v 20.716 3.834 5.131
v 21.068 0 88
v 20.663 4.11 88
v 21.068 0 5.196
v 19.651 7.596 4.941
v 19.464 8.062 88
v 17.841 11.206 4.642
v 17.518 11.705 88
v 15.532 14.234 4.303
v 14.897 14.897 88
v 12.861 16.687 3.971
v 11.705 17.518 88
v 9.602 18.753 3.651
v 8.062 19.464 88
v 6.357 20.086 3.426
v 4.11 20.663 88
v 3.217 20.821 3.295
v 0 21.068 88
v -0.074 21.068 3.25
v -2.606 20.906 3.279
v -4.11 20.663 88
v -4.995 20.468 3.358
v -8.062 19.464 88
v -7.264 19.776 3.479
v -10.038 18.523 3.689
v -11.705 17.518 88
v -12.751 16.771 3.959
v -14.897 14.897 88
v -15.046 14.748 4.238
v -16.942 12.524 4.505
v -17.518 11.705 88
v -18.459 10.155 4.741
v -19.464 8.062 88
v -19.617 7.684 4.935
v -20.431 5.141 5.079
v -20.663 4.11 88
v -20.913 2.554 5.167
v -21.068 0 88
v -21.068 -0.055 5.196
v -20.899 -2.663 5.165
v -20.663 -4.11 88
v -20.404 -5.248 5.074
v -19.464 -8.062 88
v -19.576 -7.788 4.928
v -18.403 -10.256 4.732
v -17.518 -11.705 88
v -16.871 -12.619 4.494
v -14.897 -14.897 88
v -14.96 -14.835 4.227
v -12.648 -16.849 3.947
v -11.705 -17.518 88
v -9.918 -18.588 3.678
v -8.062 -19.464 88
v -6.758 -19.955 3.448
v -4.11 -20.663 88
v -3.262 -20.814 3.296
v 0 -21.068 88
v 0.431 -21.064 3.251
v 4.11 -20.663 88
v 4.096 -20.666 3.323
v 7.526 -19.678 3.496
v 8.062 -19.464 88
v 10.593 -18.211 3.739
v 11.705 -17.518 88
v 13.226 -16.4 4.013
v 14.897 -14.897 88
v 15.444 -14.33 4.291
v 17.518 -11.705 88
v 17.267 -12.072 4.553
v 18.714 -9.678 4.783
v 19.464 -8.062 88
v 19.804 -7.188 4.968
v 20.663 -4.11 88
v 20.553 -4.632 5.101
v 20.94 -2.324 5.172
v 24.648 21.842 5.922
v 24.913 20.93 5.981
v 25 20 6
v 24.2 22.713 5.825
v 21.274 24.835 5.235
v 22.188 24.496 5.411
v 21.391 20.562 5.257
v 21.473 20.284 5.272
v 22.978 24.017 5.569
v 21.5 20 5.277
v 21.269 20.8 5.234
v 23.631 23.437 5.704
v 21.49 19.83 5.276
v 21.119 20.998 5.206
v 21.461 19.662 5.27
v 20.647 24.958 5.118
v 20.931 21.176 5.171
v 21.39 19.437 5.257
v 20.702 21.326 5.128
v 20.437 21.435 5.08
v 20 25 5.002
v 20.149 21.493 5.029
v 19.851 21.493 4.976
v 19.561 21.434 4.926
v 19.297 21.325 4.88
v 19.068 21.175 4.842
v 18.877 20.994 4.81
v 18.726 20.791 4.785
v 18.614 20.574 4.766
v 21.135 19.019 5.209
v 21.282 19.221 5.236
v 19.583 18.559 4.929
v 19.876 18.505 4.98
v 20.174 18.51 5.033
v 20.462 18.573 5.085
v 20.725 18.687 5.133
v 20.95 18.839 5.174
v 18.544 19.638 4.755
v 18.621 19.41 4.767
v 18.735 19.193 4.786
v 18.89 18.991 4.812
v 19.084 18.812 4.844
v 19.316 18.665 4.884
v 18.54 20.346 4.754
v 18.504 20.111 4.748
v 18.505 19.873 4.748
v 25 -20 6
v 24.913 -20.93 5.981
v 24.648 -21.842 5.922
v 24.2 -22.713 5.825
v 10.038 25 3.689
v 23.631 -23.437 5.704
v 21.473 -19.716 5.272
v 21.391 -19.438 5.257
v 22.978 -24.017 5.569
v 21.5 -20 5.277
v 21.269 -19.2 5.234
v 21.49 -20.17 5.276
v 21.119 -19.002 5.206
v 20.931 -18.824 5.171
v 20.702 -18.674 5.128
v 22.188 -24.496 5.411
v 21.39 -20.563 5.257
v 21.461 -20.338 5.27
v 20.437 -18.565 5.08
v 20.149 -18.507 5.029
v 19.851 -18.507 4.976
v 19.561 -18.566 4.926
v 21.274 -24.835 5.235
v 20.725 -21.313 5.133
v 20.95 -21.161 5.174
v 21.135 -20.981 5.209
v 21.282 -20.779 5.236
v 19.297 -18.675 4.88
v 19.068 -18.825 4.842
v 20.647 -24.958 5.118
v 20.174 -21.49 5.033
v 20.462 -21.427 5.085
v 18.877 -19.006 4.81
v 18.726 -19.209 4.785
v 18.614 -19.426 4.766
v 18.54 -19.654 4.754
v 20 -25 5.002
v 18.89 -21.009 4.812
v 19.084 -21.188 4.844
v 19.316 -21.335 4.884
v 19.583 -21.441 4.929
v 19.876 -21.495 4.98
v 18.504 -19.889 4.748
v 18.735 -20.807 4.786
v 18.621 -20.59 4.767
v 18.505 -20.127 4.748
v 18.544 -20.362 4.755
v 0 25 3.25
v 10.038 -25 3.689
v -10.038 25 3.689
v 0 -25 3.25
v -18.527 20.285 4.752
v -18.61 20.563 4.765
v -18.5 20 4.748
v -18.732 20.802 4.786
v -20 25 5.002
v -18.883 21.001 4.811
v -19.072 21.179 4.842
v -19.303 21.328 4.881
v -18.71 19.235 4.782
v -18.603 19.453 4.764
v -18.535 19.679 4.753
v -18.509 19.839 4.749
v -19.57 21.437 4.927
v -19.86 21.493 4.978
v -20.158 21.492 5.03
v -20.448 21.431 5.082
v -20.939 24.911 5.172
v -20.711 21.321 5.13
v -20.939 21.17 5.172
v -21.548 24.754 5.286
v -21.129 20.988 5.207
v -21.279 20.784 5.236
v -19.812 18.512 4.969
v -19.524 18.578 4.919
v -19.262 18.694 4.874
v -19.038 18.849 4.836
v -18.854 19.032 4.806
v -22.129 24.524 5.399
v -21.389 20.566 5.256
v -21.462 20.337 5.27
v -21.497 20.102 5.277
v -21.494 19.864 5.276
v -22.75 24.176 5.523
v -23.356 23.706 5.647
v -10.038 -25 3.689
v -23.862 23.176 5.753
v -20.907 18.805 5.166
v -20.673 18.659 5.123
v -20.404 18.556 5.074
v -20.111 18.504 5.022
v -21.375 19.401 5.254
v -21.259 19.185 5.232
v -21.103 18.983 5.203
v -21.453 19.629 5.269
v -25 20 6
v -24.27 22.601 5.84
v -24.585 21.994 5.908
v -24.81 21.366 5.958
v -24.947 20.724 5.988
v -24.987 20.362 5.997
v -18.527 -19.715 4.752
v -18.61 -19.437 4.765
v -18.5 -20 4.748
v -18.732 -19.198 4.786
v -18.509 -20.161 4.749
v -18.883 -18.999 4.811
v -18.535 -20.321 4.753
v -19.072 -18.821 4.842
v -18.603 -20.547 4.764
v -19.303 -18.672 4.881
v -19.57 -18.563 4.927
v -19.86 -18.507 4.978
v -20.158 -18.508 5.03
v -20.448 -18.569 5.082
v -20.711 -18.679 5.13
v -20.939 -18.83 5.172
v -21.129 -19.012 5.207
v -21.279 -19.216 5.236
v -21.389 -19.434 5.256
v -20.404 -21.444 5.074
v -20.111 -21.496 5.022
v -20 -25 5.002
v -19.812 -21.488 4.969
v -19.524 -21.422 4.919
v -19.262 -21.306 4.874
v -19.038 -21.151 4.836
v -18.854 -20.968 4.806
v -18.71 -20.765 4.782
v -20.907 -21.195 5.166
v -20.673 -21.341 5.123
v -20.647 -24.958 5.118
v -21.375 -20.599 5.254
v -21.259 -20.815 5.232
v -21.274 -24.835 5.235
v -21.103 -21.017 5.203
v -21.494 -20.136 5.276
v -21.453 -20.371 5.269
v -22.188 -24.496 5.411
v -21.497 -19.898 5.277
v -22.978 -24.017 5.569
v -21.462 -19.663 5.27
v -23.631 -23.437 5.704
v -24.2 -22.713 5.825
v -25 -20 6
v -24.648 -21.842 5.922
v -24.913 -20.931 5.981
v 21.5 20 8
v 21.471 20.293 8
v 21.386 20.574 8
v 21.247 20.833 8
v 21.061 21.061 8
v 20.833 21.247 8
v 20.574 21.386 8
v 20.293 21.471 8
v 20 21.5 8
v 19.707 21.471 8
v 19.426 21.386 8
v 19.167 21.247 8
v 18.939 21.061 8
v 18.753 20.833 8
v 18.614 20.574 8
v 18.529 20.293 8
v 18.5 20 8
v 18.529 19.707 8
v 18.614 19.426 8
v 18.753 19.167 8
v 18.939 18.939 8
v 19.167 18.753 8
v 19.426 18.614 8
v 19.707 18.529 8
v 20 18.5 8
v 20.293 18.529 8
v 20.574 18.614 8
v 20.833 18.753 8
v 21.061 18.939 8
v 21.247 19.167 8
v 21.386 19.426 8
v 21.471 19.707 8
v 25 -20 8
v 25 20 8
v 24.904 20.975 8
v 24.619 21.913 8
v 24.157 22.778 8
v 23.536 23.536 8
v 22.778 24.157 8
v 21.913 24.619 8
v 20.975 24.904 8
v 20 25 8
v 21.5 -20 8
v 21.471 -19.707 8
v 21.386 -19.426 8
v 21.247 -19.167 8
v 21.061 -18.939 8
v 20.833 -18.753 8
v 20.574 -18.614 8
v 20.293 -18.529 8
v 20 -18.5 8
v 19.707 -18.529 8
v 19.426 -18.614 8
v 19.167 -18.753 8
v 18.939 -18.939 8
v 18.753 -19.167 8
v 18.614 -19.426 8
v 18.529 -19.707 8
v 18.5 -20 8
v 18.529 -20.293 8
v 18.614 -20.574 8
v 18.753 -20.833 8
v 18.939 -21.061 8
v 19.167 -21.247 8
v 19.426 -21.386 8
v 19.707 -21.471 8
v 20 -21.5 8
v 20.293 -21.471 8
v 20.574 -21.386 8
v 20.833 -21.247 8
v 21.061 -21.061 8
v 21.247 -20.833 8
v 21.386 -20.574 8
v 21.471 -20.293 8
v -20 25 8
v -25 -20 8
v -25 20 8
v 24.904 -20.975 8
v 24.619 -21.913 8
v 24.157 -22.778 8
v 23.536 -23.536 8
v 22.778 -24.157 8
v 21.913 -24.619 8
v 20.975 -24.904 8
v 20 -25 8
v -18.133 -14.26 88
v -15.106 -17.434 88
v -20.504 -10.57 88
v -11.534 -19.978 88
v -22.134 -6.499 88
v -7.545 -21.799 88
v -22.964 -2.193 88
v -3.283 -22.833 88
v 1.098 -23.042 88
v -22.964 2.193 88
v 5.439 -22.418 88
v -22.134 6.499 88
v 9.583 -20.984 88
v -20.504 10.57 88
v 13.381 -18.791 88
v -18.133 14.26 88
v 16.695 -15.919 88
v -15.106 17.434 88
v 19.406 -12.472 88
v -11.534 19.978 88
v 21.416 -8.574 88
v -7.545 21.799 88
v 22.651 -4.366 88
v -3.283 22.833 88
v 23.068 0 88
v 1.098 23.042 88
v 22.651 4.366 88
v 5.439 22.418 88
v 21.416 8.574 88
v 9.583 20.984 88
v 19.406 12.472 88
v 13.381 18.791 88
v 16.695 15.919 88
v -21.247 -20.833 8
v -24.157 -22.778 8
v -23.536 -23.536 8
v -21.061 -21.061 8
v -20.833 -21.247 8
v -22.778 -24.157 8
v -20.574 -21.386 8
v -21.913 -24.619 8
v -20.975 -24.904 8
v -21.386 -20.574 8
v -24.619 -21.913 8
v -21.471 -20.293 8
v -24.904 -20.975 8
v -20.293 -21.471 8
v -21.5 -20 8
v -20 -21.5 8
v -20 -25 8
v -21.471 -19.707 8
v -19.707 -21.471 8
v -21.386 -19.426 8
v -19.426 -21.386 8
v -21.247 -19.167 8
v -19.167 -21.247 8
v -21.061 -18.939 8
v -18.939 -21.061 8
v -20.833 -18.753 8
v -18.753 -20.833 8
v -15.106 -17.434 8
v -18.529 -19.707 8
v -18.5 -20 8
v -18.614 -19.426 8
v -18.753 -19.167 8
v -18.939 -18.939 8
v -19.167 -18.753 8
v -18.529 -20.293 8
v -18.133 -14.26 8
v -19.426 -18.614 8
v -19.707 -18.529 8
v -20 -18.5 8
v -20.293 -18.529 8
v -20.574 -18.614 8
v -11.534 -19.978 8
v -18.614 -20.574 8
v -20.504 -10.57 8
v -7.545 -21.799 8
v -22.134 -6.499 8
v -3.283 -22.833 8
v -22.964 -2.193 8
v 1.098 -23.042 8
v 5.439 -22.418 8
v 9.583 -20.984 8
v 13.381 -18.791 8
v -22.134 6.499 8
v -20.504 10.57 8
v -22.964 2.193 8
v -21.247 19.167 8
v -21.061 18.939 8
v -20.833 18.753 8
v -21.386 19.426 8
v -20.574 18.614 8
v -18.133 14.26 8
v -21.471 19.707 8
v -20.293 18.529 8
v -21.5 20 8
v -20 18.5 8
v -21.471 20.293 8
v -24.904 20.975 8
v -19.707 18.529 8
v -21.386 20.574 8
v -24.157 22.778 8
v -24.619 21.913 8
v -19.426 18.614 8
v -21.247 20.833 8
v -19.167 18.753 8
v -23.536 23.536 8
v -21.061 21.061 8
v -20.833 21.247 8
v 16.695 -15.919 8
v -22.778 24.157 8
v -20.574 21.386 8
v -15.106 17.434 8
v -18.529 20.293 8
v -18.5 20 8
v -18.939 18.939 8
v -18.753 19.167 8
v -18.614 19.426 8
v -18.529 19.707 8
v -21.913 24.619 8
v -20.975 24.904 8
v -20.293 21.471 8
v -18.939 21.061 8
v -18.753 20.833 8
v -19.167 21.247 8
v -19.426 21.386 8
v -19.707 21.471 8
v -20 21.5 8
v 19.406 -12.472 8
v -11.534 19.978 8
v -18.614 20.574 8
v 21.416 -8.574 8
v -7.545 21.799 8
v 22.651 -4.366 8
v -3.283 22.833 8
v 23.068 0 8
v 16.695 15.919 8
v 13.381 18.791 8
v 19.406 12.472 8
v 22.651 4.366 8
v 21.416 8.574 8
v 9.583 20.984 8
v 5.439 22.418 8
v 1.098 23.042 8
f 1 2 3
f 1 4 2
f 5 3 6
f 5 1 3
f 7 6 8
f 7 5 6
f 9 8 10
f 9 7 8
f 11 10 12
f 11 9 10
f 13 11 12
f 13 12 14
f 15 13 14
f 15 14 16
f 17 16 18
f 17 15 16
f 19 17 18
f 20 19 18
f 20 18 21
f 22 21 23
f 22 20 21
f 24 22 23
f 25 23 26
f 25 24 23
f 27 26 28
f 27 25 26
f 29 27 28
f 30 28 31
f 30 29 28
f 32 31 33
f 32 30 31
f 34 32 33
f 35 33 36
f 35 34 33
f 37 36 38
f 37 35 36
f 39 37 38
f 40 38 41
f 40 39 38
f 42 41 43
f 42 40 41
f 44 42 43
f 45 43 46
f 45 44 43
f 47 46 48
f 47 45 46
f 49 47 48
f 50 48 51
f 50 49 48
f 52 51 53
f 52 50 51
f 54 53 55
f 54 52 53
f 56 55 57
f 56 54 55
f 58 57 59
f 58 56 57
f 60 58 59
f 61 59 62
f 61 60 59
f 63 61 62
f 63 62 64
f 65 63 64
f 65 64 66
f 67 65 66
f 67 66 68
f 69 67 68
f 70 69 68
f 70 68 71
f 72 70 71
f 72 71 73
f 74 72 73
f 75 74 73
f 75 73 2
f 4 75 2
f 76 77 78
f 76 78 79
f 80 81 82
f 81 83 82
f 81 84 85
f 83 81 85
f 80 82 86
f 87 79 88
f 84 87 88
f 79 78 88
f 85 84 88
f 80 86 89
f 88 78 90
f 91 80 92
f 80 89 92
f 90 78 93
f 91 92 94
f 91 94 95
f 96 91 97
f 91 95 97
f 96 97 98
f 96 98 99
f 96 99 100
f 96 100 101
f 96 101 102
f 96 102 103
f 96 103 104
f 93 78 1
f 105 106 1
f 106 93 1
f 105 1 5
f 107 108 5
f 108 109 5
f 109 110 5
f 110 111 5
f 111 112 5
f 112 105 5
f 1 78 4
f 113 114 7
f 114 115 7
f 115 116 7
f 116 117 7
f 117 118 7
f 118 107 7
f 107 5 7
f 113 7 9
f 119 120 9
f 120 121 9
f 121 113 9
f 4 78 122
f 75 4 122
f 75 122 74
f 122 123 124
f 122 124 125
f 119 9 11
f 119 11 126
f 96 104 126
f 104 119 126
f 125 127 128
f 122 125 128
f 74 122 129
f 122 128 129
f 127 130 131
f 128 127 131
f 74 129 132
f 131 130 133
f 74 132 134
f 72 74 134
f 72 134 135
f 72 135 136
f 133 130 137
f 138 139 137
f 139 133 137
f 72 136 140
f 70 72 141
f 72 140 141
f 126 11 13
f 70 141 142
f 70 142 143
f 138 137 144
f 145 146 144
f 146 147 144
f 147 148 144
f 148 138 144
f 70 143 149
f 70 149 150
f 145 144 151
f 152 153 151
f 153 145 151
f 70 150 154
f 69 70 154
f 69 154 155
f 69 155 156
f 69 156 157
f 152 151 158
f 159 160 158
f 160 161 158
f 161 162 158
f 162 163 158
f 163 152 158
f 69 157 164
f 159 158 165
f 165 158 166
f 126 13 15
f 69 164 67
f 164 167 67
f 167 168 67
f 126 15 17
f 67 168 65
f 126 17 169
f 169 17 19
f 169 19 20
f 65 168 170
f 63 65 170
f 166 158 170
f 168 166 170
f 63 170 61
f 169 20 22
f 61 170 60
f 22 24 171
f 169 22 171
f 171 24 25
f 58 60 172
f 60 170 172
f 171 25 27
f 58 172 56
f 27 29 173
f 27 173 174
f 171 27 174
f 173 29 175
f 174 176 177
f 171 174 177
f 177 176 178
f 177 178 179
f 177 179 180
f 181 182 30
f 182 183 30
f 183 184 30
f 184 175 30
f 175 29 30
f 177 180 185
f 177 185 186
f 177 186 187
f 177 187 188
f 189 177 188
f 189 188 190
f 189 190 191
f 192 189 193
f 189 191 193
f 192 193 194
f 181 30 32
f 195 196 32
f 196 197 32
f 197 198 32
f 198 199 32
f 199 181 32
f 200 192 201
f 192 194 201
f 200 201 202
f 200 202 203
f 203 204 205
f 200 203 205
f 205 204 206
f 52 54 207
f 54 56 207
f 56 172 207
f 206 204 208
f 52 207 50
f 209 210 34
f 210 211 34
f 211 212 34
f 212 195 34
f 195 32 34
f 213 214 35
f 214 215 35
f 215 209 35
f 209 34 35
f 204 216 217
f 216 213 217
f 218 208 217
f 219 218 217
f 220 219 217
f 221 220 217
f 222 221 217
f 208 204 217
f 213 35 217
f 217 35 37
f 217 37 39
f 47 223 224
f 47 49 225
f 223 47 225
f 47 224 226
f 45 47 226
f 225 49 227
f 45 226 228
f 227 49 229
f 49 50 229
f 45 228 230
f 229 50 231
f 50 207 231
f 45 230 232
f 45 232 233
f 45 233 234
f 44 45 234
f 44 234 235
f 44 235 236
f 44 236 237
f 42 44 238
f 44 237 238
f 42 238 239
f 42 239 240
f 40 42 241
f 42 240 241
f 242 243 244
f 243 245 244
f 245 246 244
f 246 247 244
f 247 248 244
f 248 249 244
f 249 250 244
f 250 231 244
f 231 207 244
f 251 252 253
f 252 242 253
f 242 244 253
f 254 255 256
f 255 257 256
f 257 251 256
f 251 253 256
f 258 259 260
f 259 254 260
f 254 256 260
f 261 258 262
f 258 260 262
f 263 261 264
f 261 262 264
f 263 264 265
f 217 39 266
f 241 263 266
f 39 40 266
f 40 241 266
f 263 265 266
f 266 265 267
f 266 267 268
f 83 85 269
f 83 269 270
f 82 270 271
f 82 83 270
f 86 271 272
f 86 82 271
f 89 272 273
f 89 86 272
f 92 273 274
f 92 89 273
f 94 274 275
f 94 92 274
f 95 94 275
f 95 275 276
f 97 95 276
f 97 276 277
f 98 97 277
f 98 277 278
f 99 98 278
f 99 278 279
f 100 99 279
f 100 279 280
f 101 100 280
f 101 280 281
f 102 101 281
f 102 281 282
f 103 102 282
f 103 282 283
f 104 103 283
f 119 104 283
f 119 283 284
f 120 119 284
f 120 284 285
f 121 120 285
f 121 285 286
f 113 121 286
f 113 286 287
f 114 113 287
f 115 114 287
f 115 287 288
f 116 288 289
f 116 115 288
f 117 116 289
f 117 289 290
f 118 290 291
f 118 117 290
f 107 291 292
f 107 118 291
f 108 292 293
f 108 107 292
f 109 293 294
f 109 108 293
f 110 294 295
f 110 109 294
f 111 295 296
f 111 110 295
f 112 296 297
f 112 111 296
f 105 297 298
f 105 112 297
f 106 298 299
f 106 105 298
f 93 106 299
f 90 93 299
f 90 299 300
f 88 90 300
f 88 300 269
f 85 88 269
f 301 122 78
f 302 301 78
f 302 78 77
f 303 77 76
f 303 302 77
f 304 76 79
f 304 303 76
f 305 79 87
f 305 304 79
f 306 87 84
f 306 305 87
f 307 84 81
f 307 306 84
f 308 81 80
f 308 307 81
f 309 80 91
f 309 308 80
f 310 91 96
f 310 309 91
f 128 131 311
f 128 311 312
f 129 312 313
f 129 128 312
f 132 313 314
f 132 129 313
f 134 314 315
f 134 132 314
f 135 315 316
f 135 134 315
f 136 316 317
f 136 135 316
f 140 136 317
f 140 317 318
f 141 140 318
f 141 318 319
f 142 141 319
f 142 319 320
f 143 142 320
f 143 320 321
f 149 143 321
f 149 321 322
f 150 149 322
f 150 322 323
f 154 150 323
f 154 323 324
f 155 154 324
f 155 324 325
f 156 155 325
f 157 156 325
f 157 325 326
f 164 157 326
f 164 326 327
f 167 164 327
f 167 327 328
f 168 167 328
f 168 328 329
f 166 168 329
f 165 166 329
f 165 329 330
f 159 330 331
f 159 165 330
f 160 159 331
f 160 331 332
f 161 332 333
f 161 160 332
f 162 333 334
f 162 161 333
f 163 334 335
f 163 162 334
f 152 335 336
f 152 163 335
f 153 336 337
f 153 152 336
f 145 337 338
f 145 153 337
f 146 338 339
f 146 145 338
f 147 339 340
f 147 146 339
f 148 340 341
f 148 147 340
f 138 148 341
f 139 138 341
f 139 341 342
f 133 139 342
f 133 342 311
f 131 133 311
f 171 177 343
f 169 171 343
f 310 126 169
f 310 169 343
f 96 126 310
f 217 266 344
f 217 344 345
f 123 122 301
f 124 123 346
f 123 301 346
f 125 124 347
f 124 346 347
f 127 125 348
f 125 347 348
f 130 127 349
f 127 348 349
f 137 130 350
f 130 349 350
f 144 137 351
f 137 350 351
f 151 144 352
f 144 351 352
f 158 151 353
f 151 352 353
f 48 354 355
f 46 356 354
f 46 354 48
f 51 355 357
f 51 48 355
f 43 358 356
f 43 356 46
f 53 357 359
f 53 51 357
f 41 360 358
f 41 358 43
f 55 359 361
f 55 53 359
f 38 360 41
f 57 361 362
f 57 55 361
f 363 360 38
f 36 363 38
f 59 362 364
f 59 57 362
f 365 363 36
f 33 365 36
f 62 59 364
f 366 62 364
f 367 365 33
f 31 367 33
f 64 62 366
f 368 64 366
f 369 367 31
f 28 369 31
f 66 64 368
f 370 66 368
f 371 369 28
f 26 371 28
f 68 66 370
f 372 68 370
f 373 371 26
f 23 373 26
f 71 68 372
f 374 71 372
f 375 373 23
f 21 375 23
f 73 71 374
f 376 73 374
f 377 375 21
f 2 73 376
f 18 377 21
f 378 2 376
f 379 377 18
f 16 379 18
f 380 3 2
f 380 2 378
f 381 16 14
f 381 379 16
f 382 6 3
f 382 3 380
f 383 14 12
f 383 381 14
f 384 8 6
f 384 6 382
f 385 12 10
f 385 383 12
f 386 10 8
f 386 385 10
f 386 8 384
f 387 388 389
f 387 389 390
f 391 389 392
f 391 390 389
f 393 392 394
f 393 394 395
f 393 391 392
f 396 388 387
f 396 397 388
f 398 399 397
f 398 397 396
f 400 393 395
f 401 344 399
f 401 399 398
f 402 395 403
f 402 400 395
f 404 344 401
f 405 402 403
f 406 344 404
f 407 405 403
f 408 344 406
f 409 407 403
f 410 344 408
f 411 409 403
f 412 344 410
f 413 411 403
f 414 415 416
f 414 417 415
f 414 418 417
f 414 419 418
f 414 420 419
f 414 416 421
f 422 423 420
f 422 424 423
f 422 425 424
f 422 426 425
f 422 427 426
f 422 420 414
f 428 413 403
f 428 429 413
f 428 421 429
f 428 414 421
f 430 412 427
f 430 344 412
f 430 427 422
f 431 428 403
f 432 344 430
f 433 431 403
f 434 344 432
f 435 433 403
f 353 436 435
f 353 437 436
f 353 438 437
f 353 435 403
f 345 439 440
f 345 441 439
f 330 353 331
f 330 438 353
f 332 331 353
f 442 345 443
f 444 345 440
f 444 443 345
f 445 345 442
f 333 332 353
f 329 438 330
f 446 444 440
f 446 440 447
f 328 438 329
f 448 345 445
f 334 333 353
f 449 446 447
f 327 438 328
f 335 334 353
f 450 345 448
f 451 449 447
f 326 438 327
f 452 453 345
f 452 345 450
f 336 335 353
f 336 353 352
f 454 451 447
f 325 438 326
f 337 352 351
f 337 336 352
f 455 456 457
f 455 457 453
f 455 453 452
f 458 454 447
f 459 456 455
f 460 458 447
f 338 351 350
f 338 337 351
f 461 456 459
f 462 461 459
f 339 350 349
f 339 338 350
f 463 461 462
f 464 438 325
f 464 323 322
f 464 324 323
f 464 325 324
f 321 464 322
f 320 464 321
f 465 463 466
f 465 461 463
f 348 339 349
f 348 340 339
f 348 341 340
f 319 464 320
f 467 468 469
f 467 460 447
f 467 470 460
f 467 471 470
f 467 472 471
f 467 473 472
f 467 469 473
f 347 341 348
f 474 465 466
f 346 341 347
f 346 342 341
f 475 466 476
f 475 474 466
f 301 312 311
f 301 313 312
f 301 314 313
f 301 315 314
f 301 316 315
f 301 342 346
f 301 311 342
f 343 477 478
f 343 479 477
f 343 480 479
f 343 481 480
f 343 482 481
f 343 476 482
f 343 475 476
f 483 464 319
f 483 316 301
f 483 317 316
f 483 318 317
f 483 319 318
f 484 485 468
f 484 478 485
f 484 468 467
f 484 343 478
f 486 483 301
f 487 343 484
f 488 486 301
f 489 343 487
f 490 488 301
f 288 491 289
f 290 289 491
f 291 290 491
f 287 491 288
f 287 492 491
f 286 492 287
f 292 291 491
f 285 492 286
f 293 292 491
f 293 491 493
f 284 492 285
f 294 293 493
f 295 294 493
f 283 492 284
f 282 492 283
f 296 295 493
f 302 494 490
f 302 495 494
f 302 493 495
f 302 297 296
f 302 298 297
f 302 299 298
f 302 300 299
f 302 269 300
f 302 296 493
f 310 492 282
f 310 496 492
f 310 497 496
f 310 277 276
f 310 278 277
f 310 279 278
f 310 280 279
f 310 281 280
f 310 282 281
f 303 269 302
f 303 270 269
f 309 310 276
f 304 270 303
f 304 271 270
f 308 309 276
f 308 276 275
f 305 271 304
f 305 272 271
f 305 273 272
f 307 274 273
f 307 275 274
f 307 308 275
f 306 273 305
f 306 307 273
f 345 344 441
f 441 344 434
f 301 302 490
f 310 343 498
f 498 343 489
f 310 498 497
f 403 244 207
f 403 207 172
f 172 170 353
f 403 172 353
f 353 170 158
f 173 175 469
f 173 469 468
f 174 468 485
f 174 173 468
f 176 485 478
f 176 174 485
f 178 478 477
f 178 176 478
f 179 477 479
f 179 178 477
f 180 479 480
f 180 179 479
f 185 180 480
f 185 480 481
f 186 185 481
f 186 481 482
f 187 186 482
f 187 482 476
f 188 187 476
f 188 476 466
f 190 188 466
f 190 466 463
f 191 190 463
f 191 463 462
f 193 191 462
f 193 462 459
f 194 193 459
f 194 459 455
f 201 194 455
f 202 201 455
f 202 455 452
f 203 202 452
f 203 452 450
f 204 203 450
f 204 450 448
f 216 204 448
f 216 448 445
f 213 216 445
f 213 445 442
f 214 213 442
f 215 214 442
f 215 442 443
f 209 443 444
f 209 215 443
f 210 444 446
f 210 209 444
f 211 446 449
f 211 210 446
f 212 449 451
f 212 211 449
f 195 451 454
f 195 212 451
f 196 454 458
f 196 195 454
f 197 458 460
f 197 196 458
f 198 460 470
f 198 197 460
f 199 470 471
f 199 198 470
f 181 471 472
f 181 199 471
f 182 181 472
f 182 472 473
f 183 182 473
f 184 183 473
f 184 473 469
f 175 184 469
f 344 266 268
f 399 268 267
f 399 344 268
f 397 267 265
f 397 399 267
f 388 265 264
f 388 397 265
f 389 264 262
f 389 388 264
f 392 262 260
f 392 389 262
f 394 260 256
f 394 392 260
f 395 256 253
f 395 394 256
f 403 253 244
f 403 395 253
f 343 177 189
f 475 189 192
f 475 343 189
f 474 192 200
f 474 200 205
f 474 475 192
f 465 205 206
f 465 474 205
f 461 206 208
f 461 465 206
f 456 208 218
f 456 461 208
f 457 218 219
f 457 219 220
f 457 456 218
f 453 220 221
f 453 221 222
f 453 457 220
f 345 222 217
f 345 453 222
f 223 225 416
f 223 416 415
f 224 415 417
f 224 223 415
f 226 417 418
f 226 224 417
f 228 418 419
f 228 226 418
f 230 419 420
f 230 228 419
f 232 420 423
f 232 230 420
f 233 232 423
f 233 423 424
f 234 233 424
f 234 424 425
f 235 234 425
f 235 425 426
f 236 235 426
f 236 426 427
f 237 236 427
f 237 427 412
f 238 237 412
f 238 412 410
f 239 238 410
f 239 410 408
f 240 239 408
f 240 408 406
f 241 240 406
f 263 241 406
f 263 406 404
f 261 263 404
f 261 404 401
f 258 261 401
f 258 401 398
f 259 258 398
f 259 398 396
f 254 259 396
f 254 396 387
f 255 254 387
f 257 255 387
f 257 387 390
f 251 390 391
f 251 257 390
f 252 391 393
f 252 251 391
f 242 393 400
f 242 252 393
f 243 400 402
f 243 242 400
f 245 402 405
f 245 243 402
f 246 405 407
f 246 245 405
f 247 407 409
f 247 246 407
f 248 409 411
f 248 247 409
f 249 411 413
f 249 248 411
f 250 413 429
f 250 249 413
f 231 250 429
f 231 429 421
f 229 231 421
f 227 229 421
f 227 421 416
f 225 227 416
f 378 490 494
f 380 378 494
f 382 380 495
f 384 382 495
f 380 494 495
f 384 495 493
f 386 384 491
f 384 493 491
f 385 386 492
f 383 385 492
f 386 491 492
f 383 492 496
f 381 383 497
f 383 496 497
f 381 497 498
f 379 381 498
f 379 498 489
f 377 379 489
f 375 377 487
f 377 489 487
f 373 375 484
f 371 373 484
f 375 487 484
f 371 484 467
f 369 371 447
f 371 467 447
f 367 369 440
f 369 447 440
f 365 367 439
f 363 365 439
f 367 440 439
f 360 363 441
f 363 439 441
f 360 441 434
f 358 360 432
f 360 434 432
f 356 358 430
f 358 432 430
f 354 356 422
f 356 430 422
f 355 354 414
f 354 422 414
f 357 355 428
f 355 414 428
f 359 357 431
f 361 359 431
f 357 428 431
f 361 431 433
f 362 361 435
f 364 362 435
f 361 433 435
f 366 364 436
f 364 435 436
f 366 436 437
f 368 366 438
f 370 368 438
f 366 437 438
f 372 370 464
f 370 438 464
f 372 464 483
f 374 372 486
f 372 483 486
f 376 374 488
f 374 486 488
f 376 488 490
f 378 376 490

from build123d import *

# Parameters (mm, degrees)
F0_W     = 50
F0_H     = 50
F0_R     = 1.5
F0_R_2   = 21.068216
F1_DEPTH = 8
F3_DEPTH = 100
F4_R     = 23.068216
F4_R_2   = 21.068216
F5_DEPTH = 80
F6_R     = 5


with BuildPart() as f1:
    # F0 (on Top) → F1 (new body)
    with BuildSketch(Plane.XY):
        Rectangle(F0_W, F0_H)
        with Locations((-20, -20)):
            Circle(F0_R, mode=Mode.SUBTRACT)
        with Locations((20, -20)):
            Circle(F0_R, mode=Mode.SUBTRACT)
        with Locations((-20, 20)):
            Circle(F0_R, mode=Mode.SUBTRACT)
        Circle(F0_R_2, mode=Mode.SUBTRACT)
        with Locations((20, 20)):
            Circle(F0_R, mode=Mode.SUBTRACT)
    extrude(amount=F1_DEPTH)

    # F2 (on face) → F3 (cut)
    with BuildSketch(Plane.XZ.offset(25)):
        with BuildLine():
            ThreePointArc((25, 6), (0, 3.249722), (-25, 6))
            Line((-25, 6), (-25, 0))
            Line((-25, 0), (25, 0))
            Line((25, 0), (25, 6))
        make_face()
    extrude(amount=-F3_DEPTH, mode=Mode.SUBTRACT)

    # F4 (on face) → F5 (join)
    with BuildSketch(Plane.XY.offset(8)):
        Circle(F4_R)
        Circle(F4_R_2, mode=Mode.SUBTRACT)
    extrude(amount=F5_DEPTH)

    # F6
    f6_edges = [f1.edges().sort_by_distance(p)[0] for p in [
        (25, -25, 7),
        (25, 25, 7),
        (-25, 25, 7),
        (-25, -25, 7),
    ]]
    fillet(f6_edges, radius=F6_R)


solid = f1.part
